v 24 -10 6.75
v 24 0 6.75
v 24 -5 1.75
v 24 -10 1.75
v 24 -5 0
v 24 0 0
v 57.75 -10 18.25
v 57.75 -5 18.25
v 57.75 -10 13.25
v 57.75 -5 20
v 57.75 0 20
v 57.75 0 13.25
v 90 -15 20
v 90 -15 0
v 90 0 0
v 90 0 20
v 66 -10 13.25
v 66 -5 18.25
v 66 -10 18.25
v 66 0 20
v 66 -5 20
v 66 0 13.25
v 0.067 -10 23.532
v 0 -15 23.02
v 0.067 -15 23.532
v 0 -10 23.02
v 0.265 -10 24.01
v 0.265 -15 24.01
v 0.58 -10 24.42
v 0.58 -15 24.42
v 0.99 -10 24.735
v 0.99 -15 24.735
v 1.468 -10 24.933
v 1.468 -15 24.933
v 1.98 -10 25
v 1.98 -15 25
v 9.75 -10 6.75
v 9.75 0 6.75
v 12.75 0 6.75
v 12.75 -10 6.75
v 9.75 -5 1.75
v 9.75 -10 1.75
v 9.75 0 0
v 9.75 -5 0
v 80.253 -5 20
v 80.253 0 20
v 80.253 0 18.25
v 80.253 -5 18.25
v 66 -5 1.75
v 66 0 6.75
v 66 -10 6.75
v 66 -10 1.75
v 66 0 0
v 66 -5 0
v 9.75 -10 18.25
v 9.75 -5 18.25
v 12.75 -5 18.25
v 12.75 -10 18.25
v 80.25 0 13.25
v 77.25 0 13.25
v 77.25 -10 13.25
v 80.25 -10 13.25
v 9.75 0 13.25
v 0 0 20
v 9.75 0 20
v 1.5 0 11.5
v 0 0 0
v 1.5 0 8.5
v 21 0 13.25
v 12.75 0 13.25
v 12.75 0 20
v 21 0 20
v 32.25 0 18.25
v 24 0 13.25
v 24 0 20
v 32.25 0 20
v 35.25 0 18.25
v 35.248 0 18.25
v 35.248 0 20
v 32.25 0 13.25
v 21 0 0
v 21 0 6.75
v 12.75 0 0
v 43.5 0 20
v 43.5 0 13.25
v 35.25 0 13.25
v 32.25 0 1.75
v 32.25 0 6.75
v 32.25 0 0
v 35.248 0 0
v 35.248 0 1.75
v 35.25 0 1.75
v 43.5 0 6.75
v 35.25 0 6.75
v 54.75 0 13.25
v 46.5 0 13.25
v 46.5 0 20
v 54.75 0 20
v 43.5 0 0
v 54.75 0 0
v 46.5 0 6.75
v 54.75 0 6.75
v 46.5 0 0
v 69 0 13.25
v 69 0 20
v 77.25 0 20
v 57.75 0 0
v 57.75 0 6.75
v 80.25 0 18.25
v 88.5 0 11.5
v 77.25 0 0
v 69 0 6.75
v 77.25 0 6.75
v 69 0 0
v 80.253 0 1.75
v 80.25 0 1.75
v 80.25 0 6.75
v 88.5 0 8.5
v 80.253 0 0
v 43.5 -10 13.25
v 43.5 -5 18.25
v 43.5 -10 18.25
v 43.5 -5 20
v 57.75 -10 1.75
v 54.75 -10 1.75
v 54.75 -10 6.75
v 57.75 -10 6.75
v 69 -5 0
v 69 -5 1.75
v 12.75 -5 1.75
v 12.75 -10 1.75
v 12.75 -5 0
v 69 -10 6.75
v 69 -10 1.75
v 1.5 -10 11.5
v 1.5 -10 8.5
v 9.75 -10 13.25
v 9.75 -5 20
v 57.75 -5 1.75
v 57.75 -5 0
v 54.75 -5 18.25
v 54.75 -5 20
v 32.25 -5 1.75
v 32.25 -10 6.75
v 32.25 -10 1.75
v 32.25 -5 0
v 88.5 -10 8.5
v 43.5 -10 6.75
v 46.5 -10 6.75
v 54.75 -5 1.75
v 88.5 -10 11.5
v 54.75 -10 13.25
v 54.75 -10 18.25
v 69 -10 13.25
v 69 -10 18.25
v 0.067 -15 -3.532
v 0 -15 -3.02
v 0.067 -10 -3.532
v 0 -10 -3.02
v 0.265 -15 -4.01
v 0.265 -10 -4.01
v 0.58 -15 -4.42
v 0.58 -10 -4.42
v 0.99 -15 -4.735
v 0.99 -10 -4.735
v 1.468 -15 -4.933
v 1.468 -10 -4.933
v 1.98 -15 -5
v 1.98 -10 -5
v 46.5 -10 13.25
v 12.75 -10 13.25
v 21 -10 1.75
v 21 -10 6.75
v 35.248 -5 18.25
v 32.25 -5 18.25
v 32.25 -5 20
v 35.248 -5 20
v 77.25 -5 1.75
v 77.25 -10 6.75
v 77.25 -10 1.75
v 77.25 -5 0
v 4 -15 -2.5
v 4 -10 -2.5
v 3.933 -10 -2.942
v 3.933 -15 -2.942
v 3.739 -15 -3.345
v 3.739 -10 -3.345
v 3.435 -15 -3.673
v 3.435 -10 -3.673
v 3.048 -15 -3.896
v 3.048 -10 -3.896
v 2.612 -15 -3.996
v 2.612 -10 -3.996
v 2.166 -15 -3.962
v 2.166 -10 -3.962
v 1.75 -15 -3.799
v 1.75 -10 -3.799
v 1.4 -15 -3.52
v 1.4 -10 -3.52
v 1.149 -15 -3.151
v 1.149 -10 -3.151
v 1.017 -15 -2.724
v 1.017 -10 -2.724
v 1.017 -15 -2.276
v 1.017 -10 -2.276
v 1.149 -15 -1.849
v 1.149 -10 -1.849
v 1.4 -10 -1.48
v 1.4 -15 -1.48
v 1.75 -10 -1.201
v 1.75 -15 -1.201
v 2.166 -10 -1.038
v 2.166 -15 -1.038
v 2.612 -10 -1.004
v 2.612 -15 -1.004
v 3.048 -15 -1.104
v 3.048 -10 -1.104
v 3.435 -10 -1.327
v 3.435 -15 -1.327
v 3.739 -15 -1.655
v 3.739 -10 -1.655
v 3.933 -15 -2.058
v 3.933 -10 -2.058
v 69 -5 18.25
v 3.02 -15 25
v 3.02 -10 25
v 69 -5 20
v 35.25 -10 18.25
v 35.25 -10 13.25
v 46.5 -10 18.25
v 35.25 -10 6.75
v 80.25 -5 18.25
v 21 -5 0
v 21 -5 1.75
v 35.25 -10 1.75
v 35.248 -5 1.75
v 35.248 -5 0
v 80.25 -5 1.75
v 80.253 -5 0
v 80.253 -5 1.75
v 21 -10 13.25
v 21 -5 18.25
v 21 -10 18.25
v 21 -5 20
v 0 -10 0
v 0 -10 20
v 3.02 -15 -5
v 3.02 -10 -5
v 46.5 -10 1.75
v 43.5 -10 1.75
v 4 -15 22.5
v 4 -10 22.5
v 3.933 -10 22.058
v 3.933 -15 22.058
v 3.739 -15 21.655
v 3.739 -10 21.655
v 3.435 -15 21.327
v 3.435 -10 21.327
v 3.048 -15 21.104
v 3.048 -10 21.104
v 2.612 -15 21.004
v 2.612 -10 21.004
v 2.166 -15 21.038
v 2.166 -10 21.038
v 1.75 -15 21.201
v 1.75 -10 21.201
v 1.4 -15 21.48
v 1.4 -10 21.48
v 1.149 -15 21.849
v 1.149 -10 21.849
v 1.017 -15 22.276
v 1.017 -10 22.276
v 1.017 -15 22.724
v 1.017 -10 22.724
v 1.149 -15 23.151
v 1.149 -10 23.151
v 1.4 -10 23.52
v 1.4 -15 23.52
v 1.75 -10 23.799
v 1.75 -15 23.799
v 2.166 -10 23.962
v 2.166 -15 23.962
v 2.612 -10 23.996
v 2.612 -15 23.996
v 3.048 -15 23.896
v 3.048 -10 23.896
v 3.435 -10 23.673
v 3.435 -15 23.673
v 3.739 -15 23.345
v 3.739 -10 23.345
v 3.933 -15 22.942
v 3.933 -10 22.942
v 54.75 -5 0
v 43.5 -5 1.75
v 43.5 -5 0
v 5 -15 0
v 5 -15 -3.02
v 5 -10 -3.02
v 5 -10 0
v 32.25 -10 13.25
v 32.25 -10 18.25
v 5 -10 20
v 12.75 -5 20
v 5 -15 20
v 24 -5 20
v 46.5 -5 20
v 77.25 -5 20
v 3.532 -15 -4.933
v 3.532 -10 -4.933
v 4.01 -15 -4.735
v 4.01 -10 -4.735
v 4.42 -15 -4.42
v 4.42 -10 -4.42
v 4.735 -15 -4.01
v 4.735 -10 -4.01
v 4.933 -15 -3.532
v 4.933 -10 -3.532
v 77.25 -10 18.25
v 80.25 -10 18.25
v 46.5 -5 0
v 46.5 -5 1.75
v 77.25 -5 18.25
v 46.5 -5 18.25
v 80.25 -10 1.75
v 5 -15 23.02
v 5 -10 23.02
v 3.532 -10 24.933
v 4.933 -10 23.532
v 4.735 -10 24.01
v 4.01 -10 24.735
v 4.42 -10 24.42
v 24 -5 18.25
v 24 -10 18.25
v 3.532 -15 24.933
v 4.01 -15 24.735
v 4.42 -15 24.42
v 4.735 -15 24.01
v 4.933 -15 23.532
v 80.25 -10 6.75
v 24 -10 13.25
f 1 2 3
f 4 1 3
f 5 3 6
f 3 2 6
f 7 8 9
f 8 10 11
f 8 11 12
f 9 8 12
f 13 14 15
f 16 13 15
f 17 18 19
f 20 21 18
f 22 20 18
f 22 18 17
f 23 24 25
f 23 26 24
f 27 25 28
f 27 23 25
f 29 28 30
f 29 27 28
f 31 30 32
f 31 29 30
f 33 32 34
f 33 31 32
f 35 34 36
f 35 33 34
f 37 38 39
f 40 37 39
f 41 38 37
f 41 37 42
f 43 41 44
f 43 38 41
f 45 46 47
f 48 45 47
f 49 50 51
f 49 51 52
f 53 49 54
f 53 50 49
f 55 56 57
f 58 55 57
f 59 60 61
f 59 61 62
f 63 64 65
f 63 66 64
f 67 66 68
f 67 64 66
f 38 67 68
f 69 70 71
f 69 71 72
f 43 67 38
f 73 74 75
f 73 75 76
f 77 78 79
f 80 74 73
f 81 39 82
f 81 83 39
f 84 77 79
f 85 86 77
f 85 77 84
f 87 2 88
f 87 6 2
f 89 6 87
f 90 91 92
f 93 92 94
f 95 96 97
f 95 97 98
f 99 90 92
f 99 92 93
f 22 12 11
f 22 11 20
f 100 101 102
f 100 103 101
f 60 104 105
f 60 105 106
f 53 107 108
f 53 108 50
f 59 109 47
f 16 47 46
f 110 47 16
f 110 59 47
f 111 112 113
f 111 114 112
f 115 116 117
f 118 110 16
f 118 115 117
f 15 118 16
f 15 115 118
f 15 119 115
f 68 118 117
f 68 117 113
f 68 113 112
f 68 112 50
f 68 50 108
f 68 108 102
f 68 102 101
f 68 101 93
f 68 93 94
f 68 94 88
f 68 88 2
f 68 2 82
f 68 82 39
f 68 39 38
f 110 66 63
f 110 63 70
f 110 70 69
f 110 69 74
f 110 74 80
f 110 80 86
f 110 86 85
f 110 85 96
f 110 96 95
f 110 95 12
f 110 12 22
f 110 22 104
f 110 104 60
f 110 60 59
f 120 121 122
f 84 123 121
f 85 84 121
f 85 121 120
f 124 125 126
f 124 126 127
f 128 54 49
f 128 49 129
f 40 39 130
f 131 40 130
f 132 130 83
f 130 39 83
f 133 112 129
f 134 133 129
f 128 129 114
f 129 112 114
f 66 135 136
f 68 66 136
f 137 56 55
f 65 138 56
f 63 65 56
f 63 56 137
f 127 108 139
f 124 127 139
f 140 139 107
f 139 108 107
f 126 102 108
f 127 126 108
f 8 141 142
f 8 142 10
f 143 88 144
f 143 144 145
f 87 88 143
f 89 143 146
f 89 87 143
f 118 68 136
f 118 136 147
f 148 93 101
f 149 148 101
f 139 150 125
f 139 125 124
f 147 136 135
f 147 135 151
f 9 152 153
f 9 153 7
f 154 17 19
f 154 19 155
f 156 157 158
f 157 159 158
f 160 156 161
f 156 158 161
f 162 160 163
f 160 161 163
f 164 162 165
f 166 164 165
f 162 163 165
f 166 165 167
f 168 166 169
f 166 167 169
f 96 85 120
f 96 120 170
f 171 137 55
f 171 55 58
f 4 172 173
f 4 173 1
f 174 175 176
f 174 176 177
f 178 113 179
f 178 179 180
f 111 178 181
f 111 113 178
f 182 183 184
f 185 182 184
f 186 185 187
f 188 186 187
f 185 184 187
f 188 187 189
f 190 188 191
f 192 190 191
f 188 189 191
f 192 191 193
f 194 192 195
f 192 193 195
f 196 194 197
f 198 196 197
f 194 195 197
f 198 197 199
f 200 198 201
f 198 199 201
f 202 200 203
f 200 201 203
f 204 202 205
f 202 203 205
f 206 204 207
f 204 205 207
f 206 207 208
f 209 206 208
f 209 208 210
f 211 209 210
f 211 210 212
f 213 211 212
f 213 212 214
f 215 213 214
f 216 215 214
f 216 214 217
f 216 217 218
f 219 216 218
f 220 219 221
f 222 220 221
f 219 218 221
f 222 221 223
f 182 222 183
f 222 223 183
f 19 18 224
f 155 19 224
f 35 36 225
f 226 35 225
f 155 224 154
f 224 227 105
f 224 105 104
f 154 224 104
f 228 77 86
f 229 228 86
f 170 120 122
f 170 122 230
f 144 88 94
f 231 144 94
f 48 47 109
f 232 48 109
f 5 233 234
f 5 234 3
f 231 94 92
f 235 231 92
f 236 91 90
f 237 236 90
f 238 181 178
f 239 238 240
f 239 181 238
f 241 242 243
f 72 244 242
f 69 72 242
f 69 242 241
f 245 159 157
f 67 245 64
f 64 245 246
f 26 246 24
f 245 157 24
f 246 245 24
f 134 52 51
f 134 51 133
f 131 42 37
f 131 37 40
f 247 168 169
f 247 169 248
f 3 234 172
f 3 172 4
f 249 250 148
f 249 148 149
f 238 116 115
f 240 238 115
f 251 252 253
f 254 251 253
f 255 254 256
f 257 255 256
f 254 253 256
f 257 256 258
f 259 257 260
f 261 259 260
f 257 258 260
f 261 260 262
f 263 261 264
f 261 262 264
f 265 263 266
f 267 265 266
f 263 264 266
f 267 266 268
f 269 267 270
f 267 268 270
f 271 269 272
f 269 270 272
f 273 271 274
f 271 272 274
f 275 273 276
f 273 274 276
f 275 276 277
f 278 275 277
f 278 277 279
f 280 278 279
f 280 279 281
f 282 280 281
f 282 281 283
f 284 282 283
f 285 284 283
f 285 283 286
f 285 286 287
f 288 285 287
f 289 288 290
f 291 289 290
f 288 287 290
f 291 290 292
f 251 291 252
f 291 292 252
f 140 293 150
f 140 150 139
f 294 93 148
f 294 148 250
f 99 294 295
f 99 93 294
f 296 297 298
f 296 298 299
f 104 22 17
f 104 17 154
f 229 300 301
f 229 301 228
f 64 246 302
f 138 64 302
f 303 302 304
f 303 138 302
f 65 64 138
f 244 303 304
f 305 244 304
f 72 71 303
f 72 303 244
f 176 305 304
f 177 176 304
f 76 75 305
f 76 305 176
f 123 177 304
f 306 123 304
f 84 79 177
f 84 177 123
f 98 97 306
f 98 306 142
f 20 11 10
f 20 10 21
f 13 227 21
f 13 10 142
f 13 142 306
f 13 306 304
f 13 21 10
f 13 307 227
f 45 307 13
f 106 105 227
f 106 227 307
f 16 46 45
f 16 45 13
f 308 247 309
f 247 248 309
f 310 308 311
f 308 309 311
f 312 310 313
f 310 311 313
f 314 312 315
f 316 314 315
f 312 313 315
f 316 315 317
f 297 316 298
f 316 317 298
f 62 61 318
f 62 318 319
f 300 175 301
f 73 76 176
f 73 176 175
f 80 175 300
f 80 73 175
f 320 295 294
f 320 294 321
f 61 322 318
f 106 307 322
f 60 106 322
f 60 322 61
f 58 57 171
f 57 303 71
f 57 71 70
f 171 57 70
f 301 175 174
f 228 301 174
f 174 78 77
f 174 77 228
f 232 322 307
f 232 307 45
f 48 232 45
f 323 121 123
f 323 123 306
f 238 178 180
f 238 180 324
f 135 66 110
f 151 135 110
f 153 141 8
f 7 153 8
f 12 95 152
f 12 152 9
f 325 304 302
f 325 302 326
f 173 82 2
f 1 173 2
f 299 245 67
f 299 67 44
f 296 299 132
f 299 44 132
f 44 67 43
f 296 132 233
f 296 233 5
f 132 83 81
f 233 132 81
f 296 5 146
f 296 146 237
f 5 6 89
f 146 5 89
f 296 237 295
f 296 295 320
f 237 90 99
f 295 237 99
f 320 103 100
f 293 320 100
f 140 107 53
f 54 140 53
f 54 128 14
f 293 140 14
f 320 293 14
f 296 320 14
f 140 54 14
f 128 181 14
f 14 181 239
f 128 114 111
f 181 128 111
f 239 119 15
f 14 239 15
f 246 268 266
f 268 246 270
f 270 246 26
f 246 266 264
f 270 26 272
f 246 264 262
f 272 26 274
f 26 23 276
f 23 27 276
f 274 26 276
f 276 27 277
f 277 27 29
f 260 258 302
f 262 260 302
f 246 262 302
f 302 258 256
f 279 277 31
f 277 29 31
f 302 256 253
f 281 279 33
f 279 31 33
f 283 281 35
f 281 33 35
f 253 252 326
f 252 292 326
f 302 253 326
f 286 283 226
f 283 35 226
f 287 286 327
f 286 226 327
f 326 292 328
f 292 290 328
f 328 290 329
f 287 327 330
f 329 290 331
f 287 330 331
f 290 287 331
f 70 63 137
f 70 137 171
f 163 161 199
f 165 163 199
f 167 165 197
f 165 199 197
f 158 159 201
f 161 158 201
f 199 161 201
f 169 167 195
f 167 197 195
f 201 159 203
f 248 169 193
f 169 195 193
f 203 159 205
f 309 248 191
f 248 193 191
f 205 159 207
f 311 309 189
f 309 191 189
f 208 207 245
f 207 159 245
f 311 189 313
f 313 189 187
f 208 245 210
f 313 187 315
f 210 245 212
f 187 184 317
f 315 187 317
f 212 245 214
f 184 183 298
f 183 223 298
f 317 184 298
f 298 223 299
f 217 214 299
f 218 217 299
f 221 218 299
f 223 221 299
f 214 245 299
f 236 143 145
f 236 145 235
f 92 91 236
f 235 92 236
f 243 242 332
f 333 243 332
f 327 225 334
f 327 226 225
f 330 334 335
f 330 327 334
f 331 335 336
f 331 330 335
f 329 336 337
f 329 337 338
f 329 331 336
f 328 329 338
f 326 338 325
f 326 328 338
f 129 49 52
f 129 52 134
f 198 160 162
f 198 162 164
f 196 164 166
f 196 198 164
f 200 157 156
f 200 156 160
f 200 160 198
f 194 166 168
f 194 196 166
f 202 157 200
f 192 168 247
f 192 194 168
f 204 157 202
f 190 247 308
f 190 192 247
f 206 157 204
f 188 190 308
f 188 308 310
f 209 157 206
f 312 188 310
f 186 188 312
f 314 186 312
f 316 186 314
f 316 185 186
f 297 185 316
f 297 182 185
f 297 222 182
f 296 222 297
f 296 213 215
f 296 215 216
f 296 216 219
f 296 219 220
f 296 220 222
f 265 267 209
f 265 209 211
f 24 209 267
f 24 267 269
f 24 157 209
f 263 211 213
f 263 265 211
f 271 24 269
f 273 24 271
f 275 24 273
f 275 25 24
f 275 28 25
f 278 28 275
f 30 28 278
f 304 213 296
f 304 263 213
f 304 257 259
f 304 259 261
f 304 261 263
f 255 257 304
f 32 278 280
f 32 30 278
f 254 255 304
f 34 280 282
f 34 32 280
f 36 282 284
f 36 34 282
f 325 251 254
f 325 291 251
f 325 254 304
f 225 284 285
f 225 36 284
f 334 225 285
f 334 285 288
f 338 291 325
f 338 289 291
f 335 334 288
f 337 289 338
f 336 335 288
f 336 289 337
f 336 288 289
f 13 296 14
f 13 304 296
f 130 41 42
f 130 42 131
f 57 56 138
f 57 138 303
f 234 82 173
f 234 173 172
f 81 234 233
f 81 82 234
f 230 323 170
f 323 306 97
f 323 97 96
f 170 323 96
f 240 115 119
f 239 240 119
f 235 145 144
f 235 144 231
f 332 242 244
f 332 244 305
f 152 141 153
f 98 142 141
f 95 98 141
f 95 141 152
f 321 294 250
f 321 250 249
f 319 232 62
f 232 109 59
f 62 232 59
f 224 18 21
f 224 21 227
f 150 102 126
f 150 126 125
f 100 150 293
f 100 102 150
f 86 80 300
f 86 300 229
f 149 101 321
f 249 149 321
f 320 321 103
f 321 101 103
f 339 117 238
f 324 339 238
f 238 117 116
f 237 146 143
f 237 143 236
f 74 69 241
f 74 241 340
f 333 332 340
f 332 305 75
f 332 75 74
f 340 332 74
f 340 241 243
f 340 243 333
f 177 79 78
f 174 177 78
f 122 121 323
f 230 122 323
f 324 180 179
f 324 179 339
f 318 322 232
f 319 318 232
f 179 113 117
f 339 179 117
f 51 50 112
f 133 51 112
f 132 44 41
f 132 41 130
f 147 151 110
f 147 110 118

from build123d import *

# Parameters (mm, degrees)
SKETCH1_W           = 90
SKETCH1_H           = 20
BOSS_EXTRUDE1_DEPTH = 20
SKETCH2_W           = 90
SKETCH2_H           = 3
CUT_EXTRUDE1_DEPTH  = 10
SKETCH3_W           = 3
SKETCH3_H           = 5
CUT_EXTRUDE2_DEPTH  = 10
SKETCH4_W           = 3
SKETCH4_H           = 1.75
SKETCH4_W_2         = 2.997618753
SKETCH4_W_3         = 3.002941468
CUT_EXTRUDE3_DEPTH  = 5
SKETCH5_W           = 1.5
SKETCH5_H           = 3
BOSS_EXTRUDE2_DEPTH = 10
SKETCH6_W           = 90
SKETCH6_H           = 5
CUT_EXTRUDE4_DEPTH  = 56
SKETCH7_W           = 5
SKETCH7_H           = 5
BOSS_EXTRUDE3_DEPTH = 5
SKETCH8_R           = 1.5
CUT_EXTRUDE5_DEPTH  = 5
FILLET3_R           = 1.98


with BuildPart() as part:
    # Sketch1 → Boss-Extrude1 (new body)
    with BuildSketch(Plane.XY):
        with Locations((45, -10)):
            Rectangle(SKETCH1_W, SKETCH1_H)
    extrude(amount=BOSS_EXTRUDE1_DEPTH)

    # Sketch2 → Cut-Extrude1 (cut)
    with BuildSketch(Plane(origin=(0, 0, 0), x_dir=(1, 0, 0), z_dir=(0, 1, 0))):
        with Locations((45, -10)):
            Rectangle(SKETCH2_W, SKETCH2_H)
    extrude(amount=-CUT_EXTRUDE1_DEPTH, mode=Mode.SUBTRACT)

    # Sketch3 → Cut-Extrude2 (cut)
    with BuildSketch(Plane(origin=(0, 0, 0), x_dir=(1, 0, 0), z_dir=(0, 1, 0))):
        with Locations((11.25, -15.75)):
            Rectangle(SKETCH3_W, SKETCH3_H)
        with Locations((22.5, -15.75)):
            Rectangle(SKETCH3_W, SKETCH3_H)
        with Locations((33.75, -15.75)):
            Rectangle(SKETCH3_W, SKETCH3_H)
        with Locations((45, -15.75)):
            Rectangle(SKETCH3_W, SKETCH3_H)
        with Locations((56.25, -15.75)):
            Rectangle(SKETCH3_W, SKETCH3_H)
        with Locations((67.5, -15.75)):
            Rectangle(SKETCH3_W, SKETCH3_H)
        with Locations((78.75, -15.75)):
            Rectangle(SKETCH3_W, SKETCH3_H)
        with Locations((11.25, -4.25)):
            Rectangle(SKETCH3_W, SKETCH3_H)
        with Locations((22.5, -4.25)):
            Rectangle(SKETCH3_W, SKETCH3_H)
        with Locations((33.75, -4.25)):
            Rectangle(SKETCH3_W, SKETCH3_H)
        with Locations((45, -4.25)):
            Rectangle(SKETCH3_W, SKETCH3_H)
        with Locations((56.25, -4.25)):
            Rectangle(SKETCH3_W, SKETCH3_H)
        with Locations((67.5, -4.25)):
            Rectangle(SKETCH3_W, SKETCH3_H)
        with Locations((78.75, -4.25)):
            Rectangle(SKETCH3_W, SKETCH3_H)
    extrude(amount=-CUT_EXTRUDE2_DEPTH, mode=Mode.SUBTRACT)

    # Sketch4 → Cut-Extrude3 (cut)
    with BuildSketch(Plane(origin=(0, 0, 0), x_dir=(1, 0, 0), z_dir=(0, 1, 0))):
        with Locations((56.25, -19.125)):
            Rectangle(SKETCH4_W, SKETCH4_H)
        with Locations((67.5, -19.125)):
            Rectangle(SKETCH4_W, SKETCH4_H)
        Polygon((77.25, -18.25), (77.25, -20), (80.252941468, -20), (80.252941468, -18.25), (80.25, -18.25), align=None)
        with Locations((45, -19.125)):
            Rectangle(SKETCH4_W, SKETCH4_H)
        with Locations((33.748809377, -19.125)):
            Rectangle(SKETCH4_W_2, SKETCH4_H)
        with Locations((22.5, -19.125)):
            Rectangle(SKETCH4_W, SKETCH4_H)
        with Locations((11.25, -19.125)):
            Rectangle(SKETCH4_W, SKETCH4_H)
        with Locations((22.5, -0.875)):
            Rectangle(SKETCH4_W, SKETCH4_H)
        with Locations((33.748809377, -0.875)):
            Rectangle(SKETCH4_W_2, SKETCH4_H)
        with Locations((45, -0.875)):
            Rectangle(SKETCH4_W, SKETCH4_H)
        with Locations((56.25, -0.875)):
            Rectangle(SKETCH4_W, SKETCH4_H)
        with Locations((67.5, -0.875)):
            Rectangle(SKETCH4_W, SKETCH4_H)
        with Locations((78.751470734, -0.875)):
            Rectangle(SKETCH4_W_3, SKETCH4_H)
        with Locations((11.25, -0.875)):
            Rectangle(SKETCH4_W, SKETCH4_H)
    extrude(amount=-CUT_EXTRUDE3_DEPTH, mode=Mode.SUBTRACT)

    # Sketch5 → Boss-Extrude2 (add)
    with BuildSketch(Plane(origin=(0, -10, 0), x_dir=(1, 0, 0), z_dir=(0, 1, 0))):
        with Locations((0.75, -10)):
            Rectangle(SKETCH5_W, SKETCH5_H)
        with Locations((89.25, -10)):
            Rectangle(SKETCH5_W, SKETCH5_H)
    extrude(amount=BOSS_EXTRUDE2_DEPTH)

    # Sketch6 → Cut-Extrude4 (cut)
    with BuildSketch(Plane.XY.offset(20)):
        with Locations((45, -17.5)):
            Rectangle(SKETCH6_W, SKETCH6_H)
    extrude(amount=-CUT_EXTRUDE4_DEPTH, mode=Mode.SUBTRACT)

    # Sketch7 → Boss-Extrude3 (add)
    with BuildSketch(Plane.XZ.offset(15)):
        with Locations((2.5, 22.5)):
            Rectangle(SKETCH7_W, SKETCH7_H)
        with Locations((2.5, -2.5)):
            Rectangle(SKETCH7_W, SKETCH7_H)
    extrude(amount=-BOSS_EXTRUDE3_DEPTH)

    # Sketch8 → Cut-Extrude5 (cut)
    with BuildSketch(Plane(origin=(0, -10, 0), x_dir=(1, 0, 0), z_dir=(0, 1, 0))):
        with Locations((2.5, 2.5)):
            Circle(SKETCH8_R)
        with Locations((2.5, -22.5)):
            Circle(SKETCH8_R)
    extrude(amount=-CUT_EXTRUDE5_DEPTH, mode=Mode.SUBTRACT)

    # Fillet3
    fillet3_edges = [part.edges().sort_by_distance(p)[0] for p in [
        (0, -12.5, 25),
        (5, -12.5, 25),
        (0, -12.5, -5),
        (5, -12.5, -5),
    ]]
    fillet(fillet3_edges, radius=FILLET3_R)


solid = part.part
